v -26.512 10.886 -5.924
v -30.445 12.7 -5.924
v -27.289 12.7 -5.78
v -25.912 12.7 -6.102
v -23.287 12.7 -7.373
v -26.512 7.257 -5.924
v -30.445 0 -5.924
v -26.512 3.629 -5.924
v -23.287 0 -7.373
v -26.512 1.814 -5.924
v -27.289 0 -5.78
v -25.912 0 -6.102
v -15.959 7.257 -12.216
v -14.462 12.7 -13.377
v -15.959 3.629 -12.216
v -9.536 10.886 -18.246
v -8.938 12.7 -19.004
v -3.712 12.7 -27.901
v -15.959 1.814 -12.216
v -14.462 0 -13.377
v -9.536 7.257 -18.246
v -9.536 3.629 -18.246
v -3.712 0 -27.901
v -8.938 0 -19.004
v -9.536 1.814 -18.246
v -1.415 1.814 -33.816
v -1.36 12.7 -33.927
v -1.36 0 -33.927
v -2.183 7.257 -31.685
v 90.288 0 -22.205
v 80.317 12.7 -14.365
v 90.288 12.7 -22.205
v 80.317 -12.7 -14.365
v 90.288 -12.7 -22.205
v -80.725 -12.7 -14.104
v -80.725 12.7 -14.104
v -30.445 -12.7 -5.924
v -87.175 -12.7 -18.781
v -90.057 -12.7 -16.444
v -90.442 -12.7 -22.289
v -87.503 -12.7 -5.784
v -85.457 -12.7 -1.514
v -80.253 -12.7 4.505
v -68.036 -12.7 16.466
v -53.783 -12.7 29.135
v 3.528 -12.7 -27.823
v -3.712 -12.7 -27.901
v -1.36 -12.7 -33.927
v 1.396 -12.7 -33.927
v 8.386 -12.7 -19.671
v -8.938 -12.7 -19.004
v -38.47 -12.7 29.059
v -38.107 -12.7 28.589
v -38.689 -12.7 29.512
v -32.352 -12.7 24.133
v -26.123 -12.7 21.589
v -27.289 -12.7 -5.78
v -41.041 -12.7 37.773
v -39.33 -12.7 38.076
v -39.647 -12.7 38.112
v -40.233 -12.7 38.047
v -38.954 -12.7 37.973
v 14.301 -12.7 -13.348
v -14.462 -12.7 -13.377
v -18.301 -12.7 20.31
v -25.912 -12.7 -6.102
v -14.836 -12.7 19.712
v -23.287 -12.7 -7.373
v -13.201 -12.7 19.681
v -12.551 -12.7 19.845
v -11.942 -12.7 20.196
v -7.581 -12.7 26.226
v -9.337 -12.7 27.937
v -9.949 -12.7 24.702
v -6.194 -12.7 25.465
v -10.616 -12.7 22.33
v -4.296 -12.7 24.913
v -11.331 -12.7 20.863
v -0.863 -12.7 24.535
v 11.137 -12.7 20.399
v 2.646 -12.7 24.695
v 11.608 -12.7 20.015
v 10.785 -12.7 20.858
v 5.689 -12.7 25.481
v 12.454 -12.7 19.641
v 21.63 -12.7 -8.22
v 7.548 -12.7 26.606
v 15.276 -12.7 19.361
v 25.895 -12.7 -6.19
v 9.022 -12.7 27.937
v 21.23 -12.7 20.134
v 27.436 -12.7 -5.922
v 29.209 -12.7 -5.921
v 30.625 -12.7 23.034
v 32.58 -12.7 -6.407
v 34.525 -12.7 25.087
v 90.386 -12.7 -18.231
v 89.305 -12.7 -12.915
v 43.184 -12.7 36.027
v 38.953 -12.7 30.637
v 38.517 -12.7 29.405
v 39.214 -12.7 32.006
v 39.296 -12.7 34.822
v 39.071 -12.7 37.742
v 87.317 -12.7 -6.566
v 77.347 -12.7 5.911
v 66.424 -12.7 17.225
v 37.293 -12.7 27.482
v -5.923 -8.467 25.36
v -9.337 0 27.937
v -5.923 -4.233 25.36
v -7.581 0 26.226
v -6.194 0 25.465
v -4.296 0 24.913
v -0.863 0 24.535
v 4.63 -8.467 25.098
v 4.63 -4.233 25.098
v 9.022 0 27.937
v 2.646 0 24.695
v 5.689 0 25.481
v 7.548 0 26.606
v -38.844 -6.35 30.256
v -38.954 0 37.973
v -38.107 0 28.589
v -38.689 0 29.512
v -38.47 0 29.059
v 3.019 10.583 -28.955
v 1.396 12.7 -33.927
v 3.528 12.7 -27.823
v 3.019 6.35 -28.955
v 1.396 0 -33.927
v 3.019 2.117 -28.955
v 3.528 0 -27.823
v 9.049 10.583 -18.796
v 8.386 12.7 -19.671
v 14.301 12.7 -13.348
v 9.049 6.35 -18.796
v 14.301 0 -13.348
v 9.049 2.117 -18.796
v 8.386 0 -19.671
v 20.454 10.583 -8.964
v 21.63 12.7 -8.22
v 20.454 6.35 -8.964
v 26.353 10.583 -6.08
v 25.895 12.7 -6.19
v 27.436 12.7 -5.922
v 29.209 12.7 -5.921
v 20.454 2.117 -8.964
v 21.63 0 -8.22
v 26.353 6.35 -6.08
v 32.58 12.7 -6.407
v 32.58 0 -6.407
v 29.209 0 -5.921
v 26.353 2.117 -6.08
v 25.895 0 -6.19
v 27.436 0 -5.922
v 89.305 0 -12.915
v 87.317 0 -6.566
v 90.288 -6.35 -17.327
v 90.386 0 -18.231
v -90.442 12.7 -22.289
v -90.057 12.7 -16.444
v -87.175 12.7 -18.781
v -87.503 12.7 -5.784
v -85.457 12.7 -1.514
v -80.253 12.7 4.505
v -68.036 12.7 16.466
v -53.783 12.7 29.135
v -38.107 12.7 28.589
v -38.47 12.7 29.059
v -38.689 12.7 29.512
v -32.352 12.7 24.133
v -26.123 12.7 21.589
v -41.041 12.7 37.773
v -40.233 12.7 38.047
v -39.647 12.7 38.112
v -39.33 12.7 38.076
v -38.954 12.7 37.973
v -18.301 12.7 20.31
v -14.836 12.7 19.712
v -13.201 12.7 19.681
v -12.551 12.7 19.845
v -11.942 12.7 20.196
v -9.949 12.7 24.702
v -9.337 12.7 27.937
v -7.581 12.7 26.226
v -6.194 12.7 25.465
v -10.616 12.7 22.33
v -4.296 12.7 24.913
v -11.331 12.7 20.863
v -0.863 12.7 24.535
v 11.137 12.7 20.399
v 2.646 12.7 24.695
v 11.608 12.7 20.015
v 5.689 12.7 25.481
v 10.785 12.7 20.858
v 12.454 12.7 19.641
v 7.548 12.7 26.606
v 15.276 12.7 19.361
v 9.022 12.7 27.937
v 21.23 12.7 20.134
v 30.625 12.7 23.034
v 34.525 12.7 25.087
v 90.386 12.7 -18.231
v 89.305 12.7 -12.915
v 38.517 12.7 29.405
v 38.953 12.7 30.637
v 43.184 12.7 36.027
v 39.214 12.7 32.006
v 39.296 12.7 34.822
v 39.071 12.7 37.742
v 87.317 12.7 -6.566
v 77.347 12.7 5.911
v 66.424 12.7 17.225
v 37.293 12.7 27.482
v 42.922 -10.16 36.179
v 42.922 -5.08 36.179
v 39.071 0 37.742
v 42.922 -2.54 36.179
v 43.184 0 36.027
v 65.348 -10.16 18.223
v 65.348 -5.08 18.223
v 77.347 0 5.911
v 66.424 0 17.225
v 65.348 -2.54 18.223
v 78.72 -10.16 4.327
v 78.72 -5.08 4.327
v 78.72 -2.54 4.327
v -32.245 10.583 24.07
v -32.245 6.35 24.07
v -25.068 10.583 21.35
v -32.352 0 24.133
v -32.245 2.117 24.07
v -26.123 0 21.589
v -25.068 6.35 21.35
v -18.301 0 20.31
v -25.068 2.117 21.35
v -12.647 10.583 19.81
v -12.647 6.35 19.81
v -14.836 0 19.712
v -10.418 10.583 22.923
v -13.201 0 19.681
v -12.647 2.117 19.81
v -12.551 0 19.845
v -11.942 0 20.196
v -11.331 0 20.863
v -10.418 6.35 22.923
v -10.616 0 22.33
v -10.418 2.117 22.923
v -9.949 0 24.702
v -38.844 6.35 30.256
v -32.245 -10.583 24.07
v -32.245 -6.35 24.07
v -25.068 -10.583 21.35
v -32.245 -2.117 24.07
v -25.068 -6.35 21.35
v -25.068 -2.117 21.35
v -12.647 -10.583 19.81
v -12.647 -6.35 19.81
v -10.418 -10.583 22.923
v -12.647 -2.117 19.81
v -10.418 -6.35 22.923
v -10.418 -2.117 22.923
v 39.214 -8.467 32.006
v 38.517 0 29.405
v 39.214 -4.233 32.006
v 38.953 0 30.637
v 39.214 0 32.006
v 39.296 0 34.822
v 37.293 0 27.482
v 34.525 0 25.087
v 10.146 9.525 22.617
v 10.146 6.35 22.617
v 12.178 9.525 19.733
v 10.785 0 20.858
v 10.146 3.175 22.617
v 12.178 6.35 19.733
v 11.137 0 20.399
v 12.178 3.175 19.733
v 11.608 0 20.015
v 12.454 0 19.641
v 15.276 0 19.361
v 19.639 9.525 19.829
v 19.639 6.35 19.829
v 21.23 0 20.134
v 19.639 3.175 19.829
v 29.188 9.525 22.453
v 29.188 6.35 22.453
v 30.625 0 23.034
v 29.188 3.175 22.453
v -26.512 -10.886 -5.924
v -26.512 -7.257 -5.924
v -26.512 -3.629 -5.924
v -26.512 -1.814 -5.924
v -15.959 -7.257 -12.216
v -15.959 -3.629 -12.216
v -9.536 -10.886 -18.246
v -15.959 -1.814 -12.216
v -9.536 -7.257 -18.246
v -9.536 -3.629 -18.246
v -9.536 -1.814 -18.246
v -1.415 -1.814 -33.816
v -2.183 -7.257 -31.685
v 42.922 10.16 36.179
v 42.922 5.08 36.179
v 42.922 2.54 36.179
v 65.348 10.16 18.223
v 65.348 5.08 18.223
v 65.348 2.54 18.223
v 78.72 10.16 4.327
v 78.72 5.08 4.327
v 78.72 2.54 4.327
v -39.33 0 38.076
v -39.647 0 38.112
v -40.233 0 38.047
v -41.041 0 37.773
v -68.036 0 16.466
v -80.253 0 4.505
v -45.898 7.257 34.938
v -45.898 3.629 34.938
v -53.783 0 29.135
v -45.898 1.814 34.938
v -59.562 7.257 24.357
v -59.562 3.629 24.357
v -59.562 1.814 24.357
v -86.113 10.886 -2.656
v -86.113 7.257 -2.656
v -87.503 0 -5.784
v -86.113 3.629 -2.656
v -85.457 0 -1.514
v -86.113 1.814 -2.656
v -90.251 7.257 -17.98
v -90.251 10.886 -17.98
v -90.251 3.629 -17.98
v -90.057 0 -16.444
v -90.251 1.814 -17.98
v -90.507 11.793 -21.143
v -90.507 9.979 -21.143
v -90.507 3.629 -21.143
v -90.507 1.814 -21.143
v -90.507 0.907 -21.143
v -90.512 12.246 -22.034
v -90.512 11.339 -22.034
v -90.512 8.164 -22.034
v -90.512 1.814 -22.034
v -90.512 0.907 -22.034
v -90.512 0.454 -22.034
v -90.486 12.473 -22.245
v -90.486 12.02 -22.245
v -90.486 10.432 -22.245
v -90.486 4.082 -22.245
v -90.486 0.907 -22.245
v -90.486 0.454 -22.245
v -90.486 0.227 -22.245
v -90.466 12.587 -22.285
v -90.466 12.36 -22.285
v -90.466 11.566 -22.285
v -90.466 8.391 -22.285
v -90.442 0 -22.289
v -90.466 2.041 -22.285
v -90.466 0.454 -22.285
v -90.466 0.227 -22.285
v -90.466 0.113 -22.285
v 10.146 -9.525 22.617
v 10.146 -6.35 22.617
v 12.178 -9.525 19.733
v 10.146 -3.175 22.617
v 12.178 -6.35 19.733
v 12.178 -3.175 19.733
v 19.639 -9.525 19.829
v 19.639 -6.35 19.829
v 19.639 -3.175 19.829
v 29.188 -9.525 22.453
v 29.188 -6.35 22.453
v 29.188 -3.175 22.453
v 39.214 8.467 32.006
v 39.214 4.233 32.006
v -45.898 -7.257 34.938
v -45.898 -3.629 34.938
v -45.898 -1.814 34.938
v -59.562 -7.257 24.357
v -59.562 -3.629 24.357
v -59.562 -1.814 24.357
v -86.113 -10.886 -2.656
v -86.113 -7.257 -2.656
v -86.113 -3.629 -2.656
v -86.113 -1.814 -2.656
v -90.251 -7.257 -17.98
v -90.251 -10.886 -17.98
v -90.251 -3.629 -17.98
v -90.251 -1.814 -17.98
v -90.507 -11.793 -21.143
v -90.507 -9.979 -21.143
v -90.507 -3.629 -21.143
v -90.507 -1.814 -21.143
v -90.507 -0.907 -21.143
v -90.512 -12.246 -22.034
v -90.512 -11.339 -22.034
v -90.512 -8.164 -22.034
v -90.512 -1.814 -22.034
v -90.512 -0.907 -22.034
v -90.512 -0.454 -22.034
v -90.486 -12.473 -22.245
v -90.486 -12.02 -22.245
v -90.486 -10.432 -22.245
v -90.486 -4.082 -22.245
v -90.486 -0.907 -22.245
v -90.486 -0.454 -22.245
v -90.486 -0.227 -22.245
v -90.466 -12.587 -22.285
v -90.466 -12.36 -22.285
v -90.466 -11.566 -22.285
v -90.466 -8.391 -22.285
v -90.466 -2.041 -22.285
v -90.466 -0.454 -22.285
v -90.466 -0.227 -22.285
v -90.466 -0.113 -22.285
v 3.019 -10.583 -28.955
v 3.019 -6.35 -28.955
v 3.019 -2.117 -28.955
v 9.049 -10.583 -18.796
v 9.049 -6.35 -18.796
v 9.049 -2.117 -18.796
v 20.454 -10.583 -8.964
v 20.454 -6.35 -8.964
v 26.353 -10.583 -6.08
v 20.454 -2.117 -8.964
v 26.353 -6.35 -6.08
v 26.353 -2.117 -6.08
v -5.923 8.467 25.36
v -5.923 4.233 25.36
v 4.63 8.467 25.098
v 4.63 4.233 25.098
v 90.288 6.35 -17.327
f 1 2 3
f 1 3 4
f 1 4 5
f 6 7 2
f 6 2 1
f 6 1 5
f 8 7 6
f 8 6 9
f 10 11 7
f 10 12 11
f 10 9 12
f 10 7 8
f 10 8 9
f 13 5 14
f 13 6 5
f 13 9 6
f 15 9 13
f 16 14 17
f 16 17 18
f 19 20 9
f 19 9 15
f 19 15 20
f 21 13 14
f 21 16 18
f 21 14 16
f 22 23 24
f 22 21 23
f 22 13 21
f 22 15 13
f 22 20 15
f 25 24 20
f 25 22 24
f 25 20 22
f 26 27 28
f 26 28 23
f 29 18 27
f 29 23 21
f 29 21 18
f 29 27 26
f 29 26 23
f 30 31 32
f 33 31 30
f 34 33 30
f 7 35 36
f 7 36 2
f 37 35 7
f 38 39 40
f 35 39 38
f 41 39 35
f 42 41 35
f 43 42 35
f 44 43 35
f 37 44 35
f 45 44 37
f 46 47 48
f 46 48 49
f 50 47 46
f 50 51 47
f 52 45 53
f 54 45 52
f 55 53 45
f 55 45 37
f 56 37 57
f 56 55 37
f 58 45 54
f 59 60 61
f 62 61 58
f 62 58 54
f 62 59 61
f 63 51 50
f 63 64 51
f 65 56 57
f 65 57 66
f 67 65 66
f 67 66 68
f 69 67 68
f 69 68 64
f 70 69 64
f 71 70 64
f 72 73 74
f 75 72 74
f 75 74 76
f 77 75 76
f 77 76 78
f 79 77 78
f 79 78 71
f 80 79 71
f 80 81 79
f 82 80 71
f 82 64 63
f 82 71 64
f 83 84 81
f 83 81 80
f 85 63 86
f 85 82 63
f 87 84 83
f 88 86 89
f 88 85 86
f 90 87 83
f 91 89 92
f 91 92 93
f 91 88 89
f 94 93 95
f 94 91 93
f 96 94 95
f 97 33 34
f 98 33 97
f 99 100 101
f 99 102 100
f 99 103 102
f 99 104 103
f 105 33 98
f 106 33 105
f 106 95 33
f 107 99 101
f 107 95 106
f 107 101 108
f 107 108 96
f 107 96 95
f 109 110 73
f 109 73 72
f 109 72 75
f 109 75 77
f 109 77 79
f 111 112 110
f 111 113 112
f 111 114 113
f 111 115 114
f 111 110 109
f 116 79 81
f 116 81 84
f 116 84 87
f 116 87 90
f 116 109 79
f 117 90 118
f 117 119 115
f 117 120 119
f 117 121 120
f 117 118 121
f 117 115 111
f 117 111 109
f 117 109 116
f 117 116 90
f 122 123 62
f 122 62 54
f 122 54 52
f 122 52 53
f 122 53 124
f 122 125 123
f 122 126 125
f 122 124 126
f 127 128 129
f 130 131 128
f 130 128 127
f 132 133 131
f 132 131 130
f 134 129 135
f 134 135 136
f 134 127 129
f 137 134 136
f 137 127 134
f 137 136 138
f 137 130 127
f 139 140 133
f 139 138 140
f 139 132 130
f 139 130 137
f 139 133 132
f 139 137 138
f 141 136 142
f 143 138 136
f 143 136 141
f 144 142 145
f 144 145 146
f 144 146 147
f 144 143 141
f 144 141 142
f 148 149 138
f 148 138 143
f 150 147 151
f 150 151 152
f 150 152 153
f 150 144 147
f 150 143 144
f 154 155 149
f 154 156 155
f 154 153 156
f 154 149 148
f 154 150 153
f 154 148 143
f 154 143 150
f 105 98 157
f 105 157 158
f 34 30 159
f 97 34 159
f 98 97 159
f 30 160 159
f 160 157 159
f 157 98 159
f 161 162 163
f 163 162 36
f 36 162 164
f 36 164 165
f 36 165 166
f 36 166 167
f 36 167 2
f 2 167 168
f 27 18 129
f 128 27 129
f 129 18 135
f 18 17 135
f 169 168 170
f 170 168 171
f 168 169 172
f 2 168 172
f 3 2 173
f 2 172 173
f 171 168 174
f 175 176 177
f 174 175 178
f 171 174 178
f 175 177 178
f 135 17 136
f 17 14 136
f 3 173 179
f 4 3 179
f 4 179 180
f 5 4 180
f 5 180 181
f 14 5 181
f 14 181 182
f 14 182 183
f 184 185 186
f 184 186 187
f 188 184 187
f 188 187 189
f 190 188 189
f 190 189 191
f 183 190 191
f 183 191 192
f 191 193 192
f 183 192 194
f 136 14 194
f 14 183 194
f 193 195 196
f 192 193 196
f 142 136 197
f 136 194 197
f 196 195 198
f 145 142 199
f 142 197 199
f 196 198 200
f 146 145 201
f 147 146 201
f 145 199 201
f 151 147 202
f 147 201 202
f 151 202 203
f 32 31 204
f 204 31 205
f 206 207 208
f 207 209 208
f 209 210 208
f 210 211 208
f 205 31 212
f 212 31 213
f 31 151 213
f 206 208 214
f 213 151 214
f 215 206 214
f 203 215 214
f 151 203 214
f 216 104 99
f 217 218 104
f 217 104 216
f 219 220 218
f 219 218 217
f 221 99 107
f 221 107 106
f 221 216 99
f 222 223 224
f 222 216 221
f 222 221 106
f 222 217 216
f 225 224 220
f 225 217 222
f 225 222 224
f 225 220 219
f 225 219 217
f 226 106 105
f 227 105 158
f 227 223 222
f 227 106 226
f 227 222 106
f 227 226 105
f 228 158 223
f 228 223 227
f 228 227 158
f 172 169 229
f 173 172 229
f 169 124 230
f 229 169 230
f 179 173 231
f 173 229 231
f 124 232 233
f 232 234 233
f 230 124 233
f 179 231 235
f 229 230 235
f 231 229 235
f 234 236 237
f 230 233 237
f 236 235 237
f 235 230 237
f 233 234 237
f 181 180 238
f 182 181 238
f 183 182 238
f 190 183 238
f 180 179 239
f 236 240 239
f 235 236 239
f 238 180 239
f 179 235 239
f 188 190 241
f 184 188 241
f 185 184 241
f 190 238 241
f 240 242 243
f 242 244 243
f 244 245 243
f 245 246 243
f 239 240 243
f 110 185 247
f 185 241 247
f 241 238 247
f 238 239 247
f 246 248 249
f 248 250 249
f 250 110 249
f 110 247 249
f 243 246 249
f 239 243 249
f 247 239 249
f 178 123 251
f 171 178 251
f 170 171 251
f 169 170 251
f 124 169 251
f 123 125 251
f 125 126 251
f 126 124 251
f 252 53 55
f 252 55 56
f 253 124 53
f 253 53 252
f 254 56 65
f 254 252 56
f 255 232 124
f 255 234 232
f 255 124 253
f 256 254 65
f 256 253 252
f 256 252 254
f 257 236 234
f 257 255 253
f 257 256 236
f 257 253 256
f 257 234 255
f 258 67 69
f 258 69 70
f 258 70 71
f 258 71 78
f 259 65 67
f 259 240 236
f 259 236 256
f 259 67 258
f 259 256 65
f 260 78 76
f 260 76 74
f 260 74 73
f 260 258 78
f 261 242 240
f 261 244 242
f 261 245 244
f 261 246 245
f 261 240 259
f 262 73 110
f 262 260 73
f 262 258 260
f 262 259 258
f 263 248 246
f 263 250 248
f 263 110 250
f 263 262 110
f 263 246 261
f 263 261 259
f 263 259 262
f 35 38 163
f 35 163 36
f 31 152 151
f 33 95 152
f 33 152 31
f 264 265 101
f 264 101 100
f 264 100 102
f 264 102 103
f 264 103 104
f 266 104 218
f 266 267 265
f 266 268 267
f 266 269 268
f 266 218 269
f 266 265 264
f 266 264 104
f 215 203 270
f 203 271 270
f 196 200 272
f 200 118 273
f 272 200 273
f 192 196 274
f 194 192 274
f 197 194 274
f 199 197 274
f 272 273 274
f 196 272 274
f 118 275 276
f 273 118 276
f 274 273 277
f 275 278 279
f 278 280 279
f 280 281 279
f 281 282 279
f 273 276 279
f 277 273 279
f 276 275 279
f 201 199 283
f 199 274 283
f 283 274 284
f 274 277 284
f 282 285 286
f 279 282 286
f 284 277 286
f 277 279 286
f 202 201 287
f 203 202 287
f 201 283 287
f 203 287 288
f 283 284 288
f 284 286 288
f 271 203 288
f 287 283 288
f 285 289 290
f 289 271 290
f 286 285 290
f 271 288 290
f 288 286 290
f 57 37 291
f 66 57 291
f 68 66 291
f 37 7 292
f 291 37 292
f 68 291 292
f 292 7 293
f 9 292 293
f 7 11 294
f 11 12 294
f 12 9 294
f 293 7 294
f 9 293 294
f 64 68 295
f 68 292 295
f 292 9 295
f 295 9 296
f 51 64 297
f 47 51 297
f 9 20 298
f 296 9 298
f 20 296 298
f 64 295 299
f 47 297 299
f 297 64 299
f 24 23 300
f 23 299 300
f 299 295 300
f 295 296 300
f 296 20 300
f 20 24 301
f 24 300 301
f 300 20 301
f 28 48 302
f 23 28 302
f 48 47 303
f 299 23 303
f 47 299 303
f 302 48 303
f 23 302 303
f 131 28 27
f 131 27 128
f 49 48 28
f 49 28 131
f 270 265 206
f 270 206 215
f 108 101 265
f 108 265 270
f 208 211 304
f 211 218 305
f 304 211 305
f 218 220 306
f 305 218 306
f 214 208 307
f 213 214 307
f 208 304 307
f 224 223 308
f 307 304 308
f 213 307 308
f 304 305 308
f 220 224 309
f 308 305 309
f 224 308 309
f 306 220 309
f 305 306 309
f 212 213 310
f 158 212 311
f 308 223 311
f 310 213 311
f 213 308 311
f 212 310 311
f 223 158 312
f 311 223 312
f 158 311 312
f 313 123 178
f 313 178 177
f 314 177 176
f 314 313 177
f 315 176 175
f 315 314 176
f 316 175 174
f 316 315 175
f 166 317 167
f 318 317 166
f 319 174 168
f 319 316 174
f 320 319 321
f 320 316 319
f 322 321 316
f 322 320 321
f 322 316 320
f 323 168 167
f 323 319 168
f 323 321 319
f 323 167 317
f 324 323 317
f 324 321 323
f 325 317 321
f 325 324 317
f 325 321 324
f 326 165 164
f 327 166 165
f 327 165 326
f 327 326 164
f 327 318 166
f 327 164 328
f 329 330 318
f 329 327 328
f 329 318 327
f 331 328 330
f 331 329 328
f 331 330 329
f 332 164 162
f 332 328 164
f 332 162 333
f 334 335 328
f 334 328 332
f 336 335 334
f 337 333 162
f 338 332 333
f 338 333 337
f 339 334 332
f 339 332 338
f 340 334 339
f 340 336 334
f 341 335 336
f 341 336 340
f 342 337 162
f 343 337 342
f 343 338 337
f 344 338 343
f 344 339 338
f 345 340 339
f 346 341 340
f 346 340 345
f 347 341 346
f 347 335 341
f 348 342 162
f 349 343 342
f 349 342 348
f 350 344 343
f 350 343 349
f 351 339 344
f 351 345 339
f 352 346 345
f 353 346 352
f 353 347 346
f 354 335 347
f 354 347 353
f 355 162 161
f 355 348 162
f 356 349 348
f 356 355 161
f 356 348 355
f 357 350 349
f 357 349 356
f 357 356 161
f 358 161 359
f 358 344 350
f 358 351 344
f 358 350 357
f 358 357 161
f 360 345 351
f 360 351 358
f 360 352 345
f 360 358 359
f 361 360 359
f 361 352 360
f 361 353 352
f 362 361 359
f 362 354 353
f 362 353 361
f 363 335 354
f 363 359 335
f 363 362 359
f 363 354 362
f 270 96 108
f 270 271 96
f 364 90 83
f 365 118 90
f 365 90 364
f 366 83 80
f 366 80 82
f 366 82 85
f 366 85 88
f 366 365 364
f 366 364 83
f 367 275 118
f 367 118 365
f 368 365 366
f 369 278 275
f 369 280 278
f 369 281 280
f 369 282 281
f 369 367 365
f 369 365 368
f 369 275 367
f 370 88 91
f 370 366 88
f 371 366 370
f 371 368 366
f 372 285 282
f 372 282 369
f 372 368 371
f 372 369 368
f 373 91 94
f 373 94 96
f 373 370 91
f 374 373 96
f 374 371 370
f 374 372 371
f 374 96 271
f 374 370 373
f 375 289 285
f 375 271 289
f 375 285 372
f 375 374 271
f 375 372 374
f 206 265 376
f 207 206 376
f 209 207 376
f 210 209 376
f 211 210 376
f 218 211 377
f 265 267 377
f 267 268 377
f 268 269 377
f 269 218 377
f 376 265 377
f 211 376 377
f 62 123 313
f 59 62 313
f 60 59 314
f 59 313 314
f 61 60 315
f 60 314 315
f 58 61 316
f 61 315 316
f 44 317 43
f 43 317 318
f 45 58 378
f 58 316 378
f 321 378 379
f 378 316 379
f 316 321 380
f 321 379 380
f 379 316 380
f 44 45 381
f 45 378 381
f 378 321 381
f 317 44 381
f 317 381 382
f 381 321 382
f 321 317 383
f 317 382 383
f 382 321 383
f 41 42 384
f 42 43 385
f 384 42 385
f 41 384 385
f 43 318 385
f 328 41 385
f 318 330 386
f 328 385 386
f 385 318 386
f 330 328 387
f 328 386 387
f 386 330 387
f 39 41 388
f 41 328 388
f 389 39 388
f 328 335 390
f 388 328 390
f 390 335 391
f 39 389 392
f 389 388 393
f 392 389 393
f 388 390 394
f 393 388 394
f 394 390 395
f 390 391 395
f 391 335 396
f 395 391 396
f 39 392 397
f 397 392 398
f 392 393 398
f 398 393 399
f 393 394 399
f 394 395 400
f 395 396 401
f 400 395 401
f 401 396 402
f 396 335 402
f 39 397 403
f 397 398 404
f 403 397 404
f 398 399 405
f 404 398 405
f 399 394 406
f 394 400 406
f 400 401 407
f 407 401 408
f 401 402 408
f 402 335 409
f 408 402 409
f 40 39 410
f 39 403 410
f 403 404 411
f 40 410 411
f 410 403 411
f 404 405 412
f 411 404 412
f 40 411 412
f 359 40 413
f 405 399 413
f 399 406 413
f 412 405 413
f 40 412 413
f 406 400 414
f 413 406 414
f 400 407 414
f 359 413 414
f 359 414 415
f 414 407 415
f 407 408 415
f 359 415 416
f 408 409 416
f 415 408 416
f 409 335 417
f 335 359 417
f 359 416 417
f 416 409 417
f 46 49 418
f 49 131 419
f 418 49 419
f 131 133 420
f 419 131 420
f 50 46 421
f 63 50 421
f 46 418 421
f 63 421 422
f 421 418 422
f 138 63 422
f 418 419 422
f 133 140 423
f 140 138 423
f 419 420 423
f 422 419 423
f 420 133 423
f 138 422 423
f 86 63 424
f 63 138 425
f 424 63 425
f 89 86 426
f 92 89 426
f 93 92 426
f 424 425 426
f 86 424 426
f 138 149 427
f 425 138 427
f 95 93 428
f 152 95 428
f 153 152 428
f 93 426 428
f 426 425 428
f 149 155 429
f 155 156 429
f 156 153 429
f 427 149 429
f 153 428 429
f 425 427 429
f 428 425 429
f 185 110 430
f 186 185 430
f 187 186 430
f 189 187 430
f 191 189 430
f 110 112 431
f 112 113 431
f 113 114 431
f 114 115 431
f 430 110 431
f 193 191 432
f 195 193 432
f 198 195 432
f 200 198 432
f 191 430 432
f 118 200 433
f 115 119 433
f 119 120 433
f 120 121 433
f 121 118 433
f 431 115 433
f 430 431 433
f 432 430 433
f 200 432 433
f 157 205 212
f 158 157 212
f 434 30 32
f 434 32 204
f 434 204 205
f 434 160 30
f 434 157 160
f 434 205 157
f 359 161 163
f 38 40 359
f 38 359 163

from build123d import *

# Parameters (mm, degrees)
F1_DEPTH = 12.7


with BuildPart() as f1:
    # F0 (on Front) → F1 (new body, symmetric)
    with BuildSketch(Plane.XZ):
        with BuildLine():
            add(Edge.make_bspline(
                [(-40.2776934206, 35.1917233848), (-39.8123265322, 36.1282814625), (-39.3830929456, 37.0505502613), (-38.953859359, 37.9728190601)],
                knots=[0.947059976, 0.947059976, 0.947059976, 0.947059976, 1, 1, 1, 1], degree=3))
            add(Edge.make_bspline(
                [(-38.953859359, 37.9728190601), (-39.3412745515, 38.0942053774), (-41.2347259268, 38.6874683521), (-61.4859654168, 23.9713996922), (-76.5783108677, 7.3102798618), (-87.346115598, -1.2952222977), (-90.3962924077, -16.8099945712), (-90.5812855703, -22.2977346681), (-90.4522033047, -22.2899740713), (-90.4421433806, -22.2893692553)],
                knots=[0, 0, 0, 0, 0.0594964598, 0.2907827461, 0.5279501993, 0.7020664352, 0.8924642538, 0.9916192868, 1, 1, 1, 1], degree=3))
            add(Edge.make_bspline(
                [(-90.4421433806, -22.2893692553), (-88.6908285148, -17.8588544537), (-85.2055447054, -9.0417069459), (-76.7181761634, 0.4161535469), (-47.5610724052, 22.4047166991), (-41.7760413171, 32.1762750136), (-40.2776934206, 35.1917233848)],
                knots=[0, 0, 0, 0, 0.211333784, 0.4205744096, 0.776608284, 0.947059976, 0.947059976, 0.947059976, 0.947059976], degree=3))
        make_face()
        with BuildLine():
            add(Edge.make_bspline(
                [(-38.953859359, 37.9728190601), (-38.9906482674, 34.871807205), (-39.047796615, 30.265050121), (-38.6104471907, 29.1576358648), (-38.1071069706, 28.5889803632)],
                knots=[0, 0, 0, 0, 0.1461939107, 0.2172428604, 0.2172428604, 0.2172428604, 0.2172428604], degree=3))
            add(Edge.make_bspline(
                [(-40.2776934206, 35.1917233848), (-39.8123265322, 36.1282814625), (-39.3830929456, 37.0505502613), (-38.953859359, 37.9728190601)],
                knots=[0.947059976, 0.947059976, 0.947059976, 0.947059976, 1, 1, 1, 1], degree=3))
            Line((-40.2776934206, 35.1917233848), (-40.2776934206, 16.0000242061))
            Line((-40.2776934206, 16.0000242061), (-74.2167965037, -9.7560574657))
            add(Edge.make_bspline(
                [(-71.4039367571, -9.4499675715), (-72.401575226, -9.5544638817), (-73.3394676265, -9.6539562253), (-74.2167965037, -9.7560574657)],
                knots=[0.7280179224, 0.7280179224, 0.7280179224, 0.7280179224, 0.7498430447, 0.7498430447, 0.7498430447, 0.7498430447], degree=3))
            Line((-71.4039367571, -9.4499675715), (-38.953859359, 15.015322715))
            Line((-38.953859359, 15.015322715), (38.2800959051, 15.015322715))
            Line((38.2800959051, 15.015322715), (71.5676033576, -10.0787399708))
            add(Edge.make_bspline(
                [(71.5676033576, -10.0787399708), (72.4844343067, -10.2354033292), (73.3456593292, -10.3814426367), (74.1409160758, -10.5150095338)],
                knots=[0.6951708947, 0.6951708947, 0.6951708947, 0.6951708947, 0.7125057217, 0.7125057217, 0.7125057217, 0.7125057217], degree=3))
            Line((74.1409160758, -10.5150095338), (38.5170668009, 16.3403237497))
            Line((38.5170668009, 16.3403237497), (38.5170668009, 29.4045320294))
            add(Edge.make_bspline(
                [(37.2925973069, 27.4816030604), (37.8025197566, 28.0881106116), (38.2122383015, 28.7278882544), (38.5170668009, 29.4045320294)],
                knots=[0.7485640259, 0.7485640259, 0.7485640259, 0.7485640259, 0.8028476948, 0.8028476948, 0.8028476948, 0.8028476948], degree=3))
            Line((37.2925973069, 27.4816030604), (37.2925973069, 16.2867400064))
            Line((37.2925973069, 16.2867400064), (-38.1071069706, 16.2867400064))
            Line((-38.1071069706, 16.2867400064), (-38.1071069706, 28.5889803632))
        make_face()
        with BuildLine():
            add(Edge.make_bspline(
                [(-38.1071069706, 28.5889803632), (-37.0928289951, 27.4430859404), (-32.0926903267, 23.438035061), (-25.2536487281, 21.0727261323), (-17.9301219592, 20.4391260424), (-12.2914743991, 18.9695386114), (-10.2093567978, 22.461065905), (-9.3597347174, 27.6663609239), (-9.3366745859, 27.9374029487)],
                knots=[0.2172428604, 0.2172428604, 0.2172428604, 0.2172428604, 0.3604131894, 0.5062109872, 0.6502845738, 0.7683080381, 0.8712831124, 0.9904730108, 0.9904730108, 0.9904730108, 0.9904730108], degree=3))
            Line((-38.1071069706, 28.5889803632), (-38.1071069706, 16.2867400064))
            Line((-38.1071069706, 16.2867400064), (37.2925973069, 16.2867400064))
            Line((37.2925973069, 16.2867400064), (37.2925973069, 27.4816030604))
            add(Edge.make_bspline(
                [(9.0216146782, 27.9374029487), (9.3869328062, 26.0689635621), (10.0465950747, 22.6953291737), (11.5426314677, 17.8436585571), (28.4844436086, 21.2626808269), (35.6172447308, 25.4889196848), (37.2925973069, 27.4816030604)],
                knots=[0, 0, 0, 0, 0.1590420299, 0.2871472151, 0.5702147794, 0.7485640259, 0.7485640259, 0.7485640259, 0.7485640259], degree=3))
            add(Edge.make_bspline(
                [(-9.3366745859, 27.9374029487), (-8.4914677318, 26.9637003703), (-6.3184807725, 24.4603569643), (5.0883368435, 24.1276496634), (7.8717811269, 26.8236799081), (9.0216146782, 27.9374029487)],
                knots=[0, 0, 0, 0, 0.2719842126, 0.6992585829, 1, 1, 1, 1], degree=3))
        make_face()
        with BuildLine():
            add(Edge.make_bspline(
                [(-74.2167965037, -9.7560574657), (-77.007953907, -10.0808850651), (-81.4936272881, -10.8042088425), (-84.5976548957, -14.0843301076), (-88.2665670283, -19.2350918475), (-90.4421433806, -22.2893692553)],
                knots=[0.7498430447, 0.7498430447, 0.7498430447, 0.7498430447, 0.8192780687, 0.8928362561, 1, 1, 1, 1], degree=3))
            Line((-90.4421433806, -22.2893692553), (-87.1752277017, -18.7813509256))
            Line((-87.1752277017, -18.7813509256), (-80.7249695063, -14.1044249758))
            Line((-80.7249695063, -14.1044249758), (-30.4452646524, -5.9236157686))
            add(Edge.make_bspline(
                [(-30.4452646524, -5.9236157686), (-29.1692303422, -5.7518238898), (-26.3196378495, -5.3681846381), (-21.0328720057, -8.7965857274), (-15.7668583106, -12.1485757509), (-8.972732686, -17.9501287669), (-3.4361064275, -27.6795673383), (-1.4833588352, -33.7284822398), (-1.3744203894, -33.9039001385), (-1.3602453982, -33.9267253876)],
                knots=[0, 0, 0, 0, 0.1232544084, 0.2752471733, 0.4315742831, 0.6160564586, 0.8323131621, 0.978180711, 1, 1, 1, 1], degree=3))
            Line((-1.3602453982, -33.9267253876), (1.3956587063, -33.9267253876))
            add(Edge.make_bspline(
                [(1.3956587063, -33.9267253876), (1.7858558115, -32.4267533649), (2.762545928, -28.6722205143), (8.6049406113, -18.387099282), (15.4451643084, -12.1613677397), (20.3378619103, -9.040848419), (26.2375389287, -5.2578241175), (30.484260366, -6.0274425096), (32.5801745057, -6.4072776586)],
                knots=[0, 0, 0, 0, 0.1407775534, 0.3523758717, 0.5402735058, 0.6885269123, 0.846276508, 1, 1, 1, 1], degree=3))
            Line((32.5801745057, -6.4072776586), (80.3172066808, -14.3650295213))
            add(Edge.make_bspline(
                [(80.3172066808, -14.3650295213), (83.6407815417, -16.9784296304), (86.9643564026, -19.5918297395), (90.2879312634, -22.2052298486)],
                knots=[0, 0, 0, 0, 12.6840092193, 12.6840092193, 12.6840092193, 12.6840092193], degree=3))
            add(Edge.make_bspline(
                [(74.1409160758, -10.5150095338), (75.4196734856, -10.7297825113), (79.5339633186, -11.4074262613), (81.4699755485, -11.6180395996), (84.3767357887, -14.5587291576), (88.0002620016, -19.2459867199), (90.2879312634, -22.2052298486)],
                knots=[0.7125057217, 0.7125057217, 0.7125057217, 0.7125057217, 0.740379787, 0.8159915961, 0.8838285292, 1, 1, 1, 1], degree=3))
            add(Edge.make_bspline(
                [(71.5676033576, -10.0787399708), (72.4844343067, -10.2354033292), (73.3456593292, -10.3814426367), (74.1409160758, -10.5150095338)],
                knots=[0.6951708947, 0.6951708947, 0.6951708947, 0.6951708947, 0.7125057217, 0.7125057217, 0.7125057217, 0.7125057217], degree=3))
            add(Edge.make_bspline(
                [(0, -29.742449522), (0.4664724682, -28.1799355132), (1.6626154918, -24.1732891226), (7.942956552, -12.7424472882), (21.8866544647, -0.8724981269), (31.6192908157, -3.0086152107), (61.0077144475, -8.2743204508), (71.5676033576, -10.0787399708)],
                knots=[0, 0, 0, 0, 0.0854049798, 0.2189980712, 0.3680363622, 0.4955115709, 0.6951708947, 0.6951708947, 0.6951708947, 0.6951708947], degree=3))
            add(Edge.make_bspline(
                [(0, -29.742449522), (-0.5495383048, -28.1531309616), (-1.9522581432, -24.0963279052), (-8.9149505936, -11.9227827763), (-16.9948519195, -5.92112566), (-22.4044072958, -2.3116193689), (-29.5488093705, -2.6202252138), (-56.6963704105, -7.938550132), (-69.3544192543, -9.2352935954), (-71.4039367571, -9.4499675715)],
                knots=[0, 0, 0, 0, 0.080810849, 0.2062731207, 0.3144633744, 0.3944820381, 0.4814375424, 0.6831810686, 0.7280179224, 0.7280179224, 0.7280179224, 0.7280179224], degree=3))
            add(Edge.make_bspline(
                [(-71.4039367571, -9.4499675715), (-72.401575226, -9.5544638817), (-73.3394676265, -9.6539562253), (-74.2167965037, -9.7560574657)],
                knots=[0.7280179224, 0.7280179224, 0.7280179224, 0.7280179224, 0.7498430447, 0.7498430447, 0.7498430447, 0.7498430447], degree=3))
        make_face()
        with BuildLine():
            add(Edge.make_bspline(
                [(-90.4421433806, -22.2893692553), (-88.6908285148, -17.8588544537), (-85.2055447054, -9.0417069459), (-76.7181761634, 0.4161535469), (-47.5610724052, 22.4047166991), (-41.7760413171, 32.1762750136), (-40.2776934206, 35.1917233848)],
                knots=[0, 0, 0, 0, 0.211333784, 0.4205744096, 0.776608284, 0.947059976, 0.947059976, 0.947059976, 0.947059976], degree=3))
            add(Edge.make_bspline(
                [(-74.2167965037, -9.7560574657), (-77.007953907, -10.0808850651), (-81.4936272881, -10.8042088425), (-84.5976548957, -14.0843301076), (-88.2665670283, -19.2350918475), (-90.4421433806, -22.2893692553)],
                knots=[0.7498430447, 0.7498430447, 0.7498430447, 0.7498430447, 0.8192780687, 0.8928362561, 1, 1, 1, 1], degree=3))
            Line((-74.2167965037, -9.7560574657), (-40.2776934206, 16.0000242061))
            Line((-40.2776934206, 16.0000242061), (-40.2776934206, 35.1917233848))
        make_face()
        with BuildLine():
            Line((38.5170668009, 29.4045320294), (37.2925973069, 27.4816030604))
            add(Edge.make_bspline(
                [(37.2925973069, 27.4816030604), (37.8025197566, 28.0881106116), (38.2122383015, 28.7278882544), (38.5170668009, 29.4045320294)],
                knots=[0.7485640259, 0.7485640259, 0.7485640259, 0.7485640259, 0.8028476948, 0.8028476948, 0.8028476948, 0.8028476948], degree=3))
        make_face()
        with BuildLine():
            add(Edge.make_bspline(
                [(38.5170668009, 29.4045320294), (39.6241703276, 31.8620276732), (39.3477087322, 34.8058105942), (39.0707291663, 37.7421304584)],
                knots=[0.8028476948, 0.8028476948, 0.8028476948, 0.8028476948, 1, 1, 1, 1], degree=3))
            Line((38.5170668009, 29.4045320294), (38.5170668009, 16.3403237497))
            Line((38.5170668009, 16.3403237497), (74.1409160758, -10.5150095338))
            add(Edge.make_bspline(
                [(74.1409160758, -10.5150095338), (75.4196734856, -10.7297825113), (79.5339633186, -11.4074262613), (81.4699755485, -11.6180395996), (84.3767357887, -14.5587291576), (88.0002620016, -19.2459867199), (90.2879312634, -22.2052298486)],
                knots=[0.7125057217, 0.7125057217, 0.7125057217, 0.7125057217, 0.740379787, 0.8159915961, 0.8838285292, 1, 1, 1, 1], degree=3))
            add(Edge.make_bspline(
                [(90.2879312634, -22.2052298486), (88.741008924, -18.4507456728), (85.2276746321, -9.9236479207), (69.4925415219, 3.1514456522), (47.7606812008, 19.2577180699), (41.8160392744, 31.9025764573), (39.0707291663, 37.7421304584)],
                knots=[0, 0, 0, 0, 0.2001083105, 0.4544813734, 0.7480726647, 1, 1, 1, 1], degree=3))
        make_face()
        with BuildLine():
            add(Edge.make_bspline(
                [(39.0707291663, 37.7421304584), (40.2422913979, 37.3901312173), (43.4193818148, 36.4355652665), (53.2343922004, 28.3044540122), (65.5532512122, 18.6319212548), (78.9050965015, 4.5977479567), (84.6709628521, -3.0542299125), (87.3172730207, -6.5661924891)],
                knots=[0, 0, 0, 0, 0.1150896641, 0.3121048623, 0.541810315, 0.7897086146, 1, 1, 1, 1], degree=3))
            add(Edge.make_bspline(
                [(90.2879312634, -22.2052298486), (88.741008924, -18.4507456728), (85.2276746321, -9.9236479207), (69.4925415219, 3.1514456522), (47.7606812008, 19.2577180699), (41.8160392744, 31.9025764573), (39.0707291663, 37.7421304584)],
                knots=[0, 0, 0, 0, 0.2001083105, 0.4544813734, 0.7480726647, 1, 1, 1, 1], degree=3))
            add(Edge.make_bspline(
                [(90.2879312634, -22.2052298486), (90.4181757057, -20.7275118544), (90.7454547336, -17.0142930767), (88.6055675564, -10.4925394633), (87.3172730207, -6.5661924891)],
                knots=[0, 0, 0, 0, 0.3979614676, 1, 1, 1, 1], degree=3))
        make_face()
        with BuildLine():
            Line((-38.953859359, 15.015322715), (-71.4039367571, -9.4499675715))
            add(Edge.make_bspline(
                [(0, -29.742449522), (-0.5495383048, -28.1531309616), (-1.9522581432, -24.0963279052), (-8.9149505936, -11.9227827763), (-16.9948519195, -5.92112566), (-22.4044072958, -2.3116193689), (-29.5488093705, -2.6202252138), (-56.6963704105, -7.938550132), (-69.3544192543, -9.2352935954), (-71.4039367571, -9.4499675715)],
                knots=[0, 0, 0, 0, 0.080810849, 0.2062731207, 0.3144633744, 0.3944820381, 0.4814375424, 0.6831810686, 0.7280179224, 0.7280179224, 0.7280179224, 0.7280179224], degree=3))
            add(Edge.make_bspline(
                [(0, -29.742449522), (0.4664724682, -28.1799355132), (1.6626154918, -24.1732891226), (7.942956552, -12.7424472882), (21.8866544647, -0.8724981269), (31.6192908157, -3.0086152107), (61.0077144475, -8.2743204508), (71.5676033576, -10.0787399708)],
                knots=[0, 0, 0, 0, 0.0854049798, 0.2189980712, 0.3680363622, 0.4955115709, 0.6951708947, 0.6951708947, 0.6951708947, 0.6951708947], degree=3))
            Line((71.5676033576, -10.0787399708), (38.2800959051, 15.015322715))
            Line((38.2800959051, 15.015322715), (-38.953859359, 15.015322715))
        make_face()
    extrude(amount=F1_DEPTH, both=True)


solid = f1.part
